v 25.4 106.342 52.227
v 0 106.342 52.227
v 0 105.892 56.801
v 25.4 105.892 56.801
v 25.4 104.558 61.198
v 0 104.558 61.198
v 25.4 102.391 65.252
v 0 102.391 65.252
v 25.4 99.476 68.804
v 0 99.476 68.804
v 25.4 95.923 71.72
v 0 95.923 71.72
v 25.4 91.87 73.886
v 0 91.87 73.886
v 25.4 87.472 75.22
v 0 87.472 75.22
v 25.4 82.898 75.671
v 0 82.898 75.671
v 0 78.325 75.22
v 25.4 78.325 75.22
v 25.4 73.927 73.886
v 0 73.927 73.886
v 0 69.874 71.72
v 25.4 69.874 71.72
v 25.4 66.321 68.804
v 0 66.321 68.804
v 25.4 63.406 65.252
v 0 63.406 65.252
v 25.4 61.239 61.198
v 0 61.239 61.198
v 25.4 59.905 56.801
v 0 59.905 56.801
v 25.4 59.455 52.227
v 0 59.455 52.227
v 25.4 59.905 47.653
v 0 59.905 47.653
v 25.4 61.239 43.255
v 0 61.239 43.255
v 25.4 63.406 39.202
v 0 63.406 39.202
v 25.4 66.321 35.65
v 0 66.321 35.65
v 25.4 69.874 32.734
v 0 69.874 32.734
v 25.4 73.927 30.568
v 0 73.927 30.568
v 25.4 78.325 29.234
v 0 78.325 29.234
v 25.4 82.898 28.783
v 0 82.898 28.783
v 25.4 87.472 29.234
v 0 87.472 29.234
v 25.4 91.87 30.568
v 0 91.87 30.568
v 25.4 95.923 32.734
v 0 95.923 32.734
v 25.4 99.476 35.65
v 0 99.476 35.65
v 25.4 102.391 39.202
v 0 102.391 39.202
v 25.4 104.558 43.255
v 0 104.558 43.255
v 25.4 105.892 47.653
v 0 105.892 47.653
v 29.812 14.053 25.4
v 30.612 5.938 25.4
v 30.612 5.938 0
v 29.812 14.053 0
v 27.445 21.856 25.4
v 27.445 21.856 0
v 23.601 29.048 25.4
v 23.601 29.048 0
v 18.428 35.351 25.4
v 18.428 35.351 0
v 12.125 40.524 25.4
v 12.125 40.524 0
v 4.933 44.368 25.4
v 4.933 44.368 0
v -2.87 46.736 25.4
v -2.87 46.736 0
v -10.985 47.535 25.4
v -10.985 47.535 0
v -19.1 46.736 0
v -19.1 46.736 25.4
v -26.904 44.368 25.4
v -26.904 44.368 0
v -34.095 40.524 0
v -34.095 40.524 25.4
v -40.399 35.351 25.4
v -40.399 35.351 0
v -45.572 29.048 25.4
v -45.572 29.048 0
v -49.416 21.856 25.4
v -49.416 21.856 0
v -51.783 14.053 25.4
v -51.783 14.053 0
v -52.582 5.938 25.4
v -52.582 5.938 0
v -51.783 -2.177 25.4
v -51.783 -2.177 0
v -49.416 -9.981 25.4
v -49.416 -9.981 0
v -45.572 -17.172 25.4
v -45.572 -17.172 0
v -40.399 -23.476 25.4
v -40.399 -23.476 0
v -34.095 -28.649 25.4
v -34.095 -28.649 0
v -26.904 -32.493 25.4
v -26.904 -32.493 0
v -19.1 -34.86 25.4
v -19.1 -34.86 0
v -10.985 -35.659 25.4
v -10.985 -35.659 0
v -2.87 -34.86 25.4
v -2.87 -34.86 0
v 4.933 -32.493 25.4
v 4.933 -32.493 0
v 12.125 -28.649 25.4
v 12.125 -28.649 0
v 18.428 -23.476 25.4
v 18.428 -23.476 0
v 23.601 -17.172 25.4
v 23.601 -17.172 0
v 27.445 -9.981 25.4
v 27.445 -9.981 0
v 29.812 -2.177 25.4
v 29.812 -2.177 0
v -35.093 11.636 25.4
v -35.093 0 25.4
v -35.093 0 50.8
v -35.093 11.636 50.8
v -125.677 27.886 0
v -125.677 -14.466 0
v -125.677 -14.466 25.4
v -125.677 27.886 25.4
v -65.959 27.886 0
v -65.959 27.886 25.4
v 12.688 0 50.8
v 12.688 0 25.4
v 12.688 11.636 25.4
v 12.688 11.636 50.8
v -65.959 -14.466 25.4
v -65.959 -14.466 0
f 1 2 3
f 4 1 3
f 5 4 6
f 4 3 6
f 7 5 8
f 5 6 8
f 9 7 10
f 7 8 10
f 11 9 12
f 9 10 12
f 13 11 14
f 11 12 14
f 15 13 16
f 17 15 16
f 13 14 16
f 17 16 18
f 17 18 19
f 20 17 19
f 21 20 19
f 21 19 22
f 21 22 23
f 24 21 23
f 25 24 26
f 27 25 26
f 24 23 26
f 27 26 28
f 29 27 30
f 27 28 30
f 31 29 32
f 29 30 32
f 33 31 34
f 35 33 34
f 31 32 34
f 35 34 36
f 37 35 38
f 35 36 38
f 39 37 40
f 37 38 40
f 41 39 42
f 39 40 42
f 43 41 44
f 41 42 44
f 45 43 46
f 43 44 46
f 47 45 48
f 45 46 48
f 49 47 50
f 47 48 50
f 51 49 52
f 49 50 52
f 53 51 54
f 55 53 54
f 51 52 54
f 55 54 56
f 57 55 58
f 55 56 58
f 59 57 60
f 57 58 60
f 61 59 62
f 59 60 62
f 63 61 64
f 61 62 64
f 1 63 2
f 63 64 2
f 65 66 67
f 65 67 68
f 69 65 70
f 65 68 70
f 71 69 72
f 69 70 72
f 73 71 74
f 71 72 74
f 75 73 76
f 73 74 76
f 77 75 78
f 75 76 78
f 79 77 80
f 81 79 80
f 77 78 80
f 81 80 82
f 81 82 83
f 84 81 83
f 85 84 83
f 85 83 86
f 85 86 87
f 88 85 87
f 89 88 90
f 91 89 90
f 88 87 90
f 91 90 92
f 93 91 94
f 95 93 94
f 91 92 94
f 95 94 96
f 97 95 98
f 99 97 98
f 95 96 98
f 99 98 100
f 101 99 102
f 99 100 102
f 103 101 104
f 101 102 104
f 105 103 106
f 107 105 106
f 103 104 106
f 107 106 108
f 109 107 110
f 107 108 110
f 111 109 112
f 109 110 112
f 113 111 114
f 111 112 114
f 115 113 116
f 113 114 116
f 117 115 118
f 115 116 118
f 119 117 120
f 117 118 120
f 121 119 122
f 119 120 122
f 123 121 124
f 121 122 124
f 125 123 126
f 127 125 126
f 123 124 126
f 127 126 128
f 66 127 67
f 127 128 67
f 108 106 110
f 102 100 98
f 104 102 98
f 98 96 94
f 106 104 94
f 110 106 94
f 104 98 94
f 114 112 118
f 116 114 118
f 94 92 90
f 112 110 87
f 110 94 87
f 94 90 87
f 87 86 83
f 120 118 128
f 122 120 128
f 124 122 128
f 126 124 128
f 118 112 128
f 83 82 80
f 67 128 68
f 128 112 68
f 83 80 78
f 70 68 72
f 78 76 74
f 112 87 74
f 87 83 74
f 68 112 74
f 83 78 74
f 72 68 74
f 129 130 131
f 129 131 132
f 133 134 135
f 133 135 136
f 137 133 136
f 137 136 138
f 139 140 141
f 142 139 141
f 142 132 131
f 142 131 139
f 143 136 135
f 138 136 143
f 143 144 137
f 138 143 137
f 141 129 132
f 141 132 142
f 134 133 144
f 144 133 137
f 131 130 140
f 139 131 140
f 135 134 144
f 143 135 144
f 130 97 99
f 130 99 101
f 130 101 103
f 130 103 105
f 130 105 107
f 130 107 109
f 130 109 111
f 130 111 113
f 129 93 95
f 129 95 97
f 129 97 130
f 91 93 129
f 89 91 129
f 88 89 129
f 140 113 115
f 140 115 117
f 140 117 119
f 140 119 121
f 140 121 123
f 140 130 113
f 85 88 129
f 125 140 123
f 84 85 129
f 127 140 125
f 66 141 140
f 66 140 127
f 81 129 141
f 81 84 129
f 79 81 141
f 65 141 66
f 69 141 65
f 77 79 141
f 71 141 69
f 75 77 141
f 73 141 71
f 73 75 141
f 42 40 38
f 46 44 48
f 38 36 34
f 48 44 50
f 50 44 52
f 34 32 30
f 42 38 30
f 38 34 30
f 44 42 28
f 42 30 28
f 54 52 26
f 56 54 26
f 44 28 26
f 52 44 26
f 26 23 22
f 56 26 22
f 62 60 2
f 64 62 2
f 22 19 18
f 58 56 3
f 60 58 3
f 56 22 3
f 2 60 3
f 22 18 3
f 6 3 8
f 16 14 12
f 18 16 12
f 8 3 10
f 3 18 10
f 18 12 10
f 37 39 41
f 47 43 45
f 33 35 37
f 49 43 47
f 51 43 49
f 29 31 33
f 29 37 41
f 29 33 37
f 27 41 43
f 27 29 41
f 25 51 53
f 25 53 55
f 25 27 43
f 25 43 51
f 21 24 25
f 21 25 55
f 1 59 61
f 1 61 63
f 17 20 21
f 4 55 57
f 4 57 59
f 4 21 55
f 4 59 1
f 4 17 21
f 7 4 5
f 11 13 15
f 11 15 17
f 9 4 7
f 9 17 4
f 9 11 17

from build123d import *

# Parameters (mm, degrees)
F0_R     = 41.596931
F0_W     = 59.718154
F0_H     = 42.351853
F1_DEPTH = 25.4
F2_R     = 23.443831
F3_DEPTH = 25.4
F4_W     = 47.780975
F4_H     = 11.636088
F5_DEPTH = 25.4


with BuildPart() as f1:
    # F0 (on Top) → F1 (new body)
    with BuildSketch(Plane.XY):
        with Locations((-10.985292, 5.937867)):
            Circle(F0_R)
        with Locations((-95.818374, 6.710134)):
            Rectangle(F0_W, F0_H)
    extrude(amount=F1_DEPTH)

    # F4 (on face) → F5 (join)
    with BuildSketch(Plane.XY.offset(25.4)):
        with Locations((-11.202571, 5.818044)):
            Rectangle(F4_W, F4_H)
    extrude(amount=F5_DEPTH)


with BuildPart() as f3:
    # F2 (on Right) → F3 (new body)
    with BuildSketch(Plane.YZ):
        with Locations((82.898386, 52.226916)):
            Circle(F2_R)
    extrude(amount=F3_DEPTH)


solid = Compound([f1.part, f3.part])
